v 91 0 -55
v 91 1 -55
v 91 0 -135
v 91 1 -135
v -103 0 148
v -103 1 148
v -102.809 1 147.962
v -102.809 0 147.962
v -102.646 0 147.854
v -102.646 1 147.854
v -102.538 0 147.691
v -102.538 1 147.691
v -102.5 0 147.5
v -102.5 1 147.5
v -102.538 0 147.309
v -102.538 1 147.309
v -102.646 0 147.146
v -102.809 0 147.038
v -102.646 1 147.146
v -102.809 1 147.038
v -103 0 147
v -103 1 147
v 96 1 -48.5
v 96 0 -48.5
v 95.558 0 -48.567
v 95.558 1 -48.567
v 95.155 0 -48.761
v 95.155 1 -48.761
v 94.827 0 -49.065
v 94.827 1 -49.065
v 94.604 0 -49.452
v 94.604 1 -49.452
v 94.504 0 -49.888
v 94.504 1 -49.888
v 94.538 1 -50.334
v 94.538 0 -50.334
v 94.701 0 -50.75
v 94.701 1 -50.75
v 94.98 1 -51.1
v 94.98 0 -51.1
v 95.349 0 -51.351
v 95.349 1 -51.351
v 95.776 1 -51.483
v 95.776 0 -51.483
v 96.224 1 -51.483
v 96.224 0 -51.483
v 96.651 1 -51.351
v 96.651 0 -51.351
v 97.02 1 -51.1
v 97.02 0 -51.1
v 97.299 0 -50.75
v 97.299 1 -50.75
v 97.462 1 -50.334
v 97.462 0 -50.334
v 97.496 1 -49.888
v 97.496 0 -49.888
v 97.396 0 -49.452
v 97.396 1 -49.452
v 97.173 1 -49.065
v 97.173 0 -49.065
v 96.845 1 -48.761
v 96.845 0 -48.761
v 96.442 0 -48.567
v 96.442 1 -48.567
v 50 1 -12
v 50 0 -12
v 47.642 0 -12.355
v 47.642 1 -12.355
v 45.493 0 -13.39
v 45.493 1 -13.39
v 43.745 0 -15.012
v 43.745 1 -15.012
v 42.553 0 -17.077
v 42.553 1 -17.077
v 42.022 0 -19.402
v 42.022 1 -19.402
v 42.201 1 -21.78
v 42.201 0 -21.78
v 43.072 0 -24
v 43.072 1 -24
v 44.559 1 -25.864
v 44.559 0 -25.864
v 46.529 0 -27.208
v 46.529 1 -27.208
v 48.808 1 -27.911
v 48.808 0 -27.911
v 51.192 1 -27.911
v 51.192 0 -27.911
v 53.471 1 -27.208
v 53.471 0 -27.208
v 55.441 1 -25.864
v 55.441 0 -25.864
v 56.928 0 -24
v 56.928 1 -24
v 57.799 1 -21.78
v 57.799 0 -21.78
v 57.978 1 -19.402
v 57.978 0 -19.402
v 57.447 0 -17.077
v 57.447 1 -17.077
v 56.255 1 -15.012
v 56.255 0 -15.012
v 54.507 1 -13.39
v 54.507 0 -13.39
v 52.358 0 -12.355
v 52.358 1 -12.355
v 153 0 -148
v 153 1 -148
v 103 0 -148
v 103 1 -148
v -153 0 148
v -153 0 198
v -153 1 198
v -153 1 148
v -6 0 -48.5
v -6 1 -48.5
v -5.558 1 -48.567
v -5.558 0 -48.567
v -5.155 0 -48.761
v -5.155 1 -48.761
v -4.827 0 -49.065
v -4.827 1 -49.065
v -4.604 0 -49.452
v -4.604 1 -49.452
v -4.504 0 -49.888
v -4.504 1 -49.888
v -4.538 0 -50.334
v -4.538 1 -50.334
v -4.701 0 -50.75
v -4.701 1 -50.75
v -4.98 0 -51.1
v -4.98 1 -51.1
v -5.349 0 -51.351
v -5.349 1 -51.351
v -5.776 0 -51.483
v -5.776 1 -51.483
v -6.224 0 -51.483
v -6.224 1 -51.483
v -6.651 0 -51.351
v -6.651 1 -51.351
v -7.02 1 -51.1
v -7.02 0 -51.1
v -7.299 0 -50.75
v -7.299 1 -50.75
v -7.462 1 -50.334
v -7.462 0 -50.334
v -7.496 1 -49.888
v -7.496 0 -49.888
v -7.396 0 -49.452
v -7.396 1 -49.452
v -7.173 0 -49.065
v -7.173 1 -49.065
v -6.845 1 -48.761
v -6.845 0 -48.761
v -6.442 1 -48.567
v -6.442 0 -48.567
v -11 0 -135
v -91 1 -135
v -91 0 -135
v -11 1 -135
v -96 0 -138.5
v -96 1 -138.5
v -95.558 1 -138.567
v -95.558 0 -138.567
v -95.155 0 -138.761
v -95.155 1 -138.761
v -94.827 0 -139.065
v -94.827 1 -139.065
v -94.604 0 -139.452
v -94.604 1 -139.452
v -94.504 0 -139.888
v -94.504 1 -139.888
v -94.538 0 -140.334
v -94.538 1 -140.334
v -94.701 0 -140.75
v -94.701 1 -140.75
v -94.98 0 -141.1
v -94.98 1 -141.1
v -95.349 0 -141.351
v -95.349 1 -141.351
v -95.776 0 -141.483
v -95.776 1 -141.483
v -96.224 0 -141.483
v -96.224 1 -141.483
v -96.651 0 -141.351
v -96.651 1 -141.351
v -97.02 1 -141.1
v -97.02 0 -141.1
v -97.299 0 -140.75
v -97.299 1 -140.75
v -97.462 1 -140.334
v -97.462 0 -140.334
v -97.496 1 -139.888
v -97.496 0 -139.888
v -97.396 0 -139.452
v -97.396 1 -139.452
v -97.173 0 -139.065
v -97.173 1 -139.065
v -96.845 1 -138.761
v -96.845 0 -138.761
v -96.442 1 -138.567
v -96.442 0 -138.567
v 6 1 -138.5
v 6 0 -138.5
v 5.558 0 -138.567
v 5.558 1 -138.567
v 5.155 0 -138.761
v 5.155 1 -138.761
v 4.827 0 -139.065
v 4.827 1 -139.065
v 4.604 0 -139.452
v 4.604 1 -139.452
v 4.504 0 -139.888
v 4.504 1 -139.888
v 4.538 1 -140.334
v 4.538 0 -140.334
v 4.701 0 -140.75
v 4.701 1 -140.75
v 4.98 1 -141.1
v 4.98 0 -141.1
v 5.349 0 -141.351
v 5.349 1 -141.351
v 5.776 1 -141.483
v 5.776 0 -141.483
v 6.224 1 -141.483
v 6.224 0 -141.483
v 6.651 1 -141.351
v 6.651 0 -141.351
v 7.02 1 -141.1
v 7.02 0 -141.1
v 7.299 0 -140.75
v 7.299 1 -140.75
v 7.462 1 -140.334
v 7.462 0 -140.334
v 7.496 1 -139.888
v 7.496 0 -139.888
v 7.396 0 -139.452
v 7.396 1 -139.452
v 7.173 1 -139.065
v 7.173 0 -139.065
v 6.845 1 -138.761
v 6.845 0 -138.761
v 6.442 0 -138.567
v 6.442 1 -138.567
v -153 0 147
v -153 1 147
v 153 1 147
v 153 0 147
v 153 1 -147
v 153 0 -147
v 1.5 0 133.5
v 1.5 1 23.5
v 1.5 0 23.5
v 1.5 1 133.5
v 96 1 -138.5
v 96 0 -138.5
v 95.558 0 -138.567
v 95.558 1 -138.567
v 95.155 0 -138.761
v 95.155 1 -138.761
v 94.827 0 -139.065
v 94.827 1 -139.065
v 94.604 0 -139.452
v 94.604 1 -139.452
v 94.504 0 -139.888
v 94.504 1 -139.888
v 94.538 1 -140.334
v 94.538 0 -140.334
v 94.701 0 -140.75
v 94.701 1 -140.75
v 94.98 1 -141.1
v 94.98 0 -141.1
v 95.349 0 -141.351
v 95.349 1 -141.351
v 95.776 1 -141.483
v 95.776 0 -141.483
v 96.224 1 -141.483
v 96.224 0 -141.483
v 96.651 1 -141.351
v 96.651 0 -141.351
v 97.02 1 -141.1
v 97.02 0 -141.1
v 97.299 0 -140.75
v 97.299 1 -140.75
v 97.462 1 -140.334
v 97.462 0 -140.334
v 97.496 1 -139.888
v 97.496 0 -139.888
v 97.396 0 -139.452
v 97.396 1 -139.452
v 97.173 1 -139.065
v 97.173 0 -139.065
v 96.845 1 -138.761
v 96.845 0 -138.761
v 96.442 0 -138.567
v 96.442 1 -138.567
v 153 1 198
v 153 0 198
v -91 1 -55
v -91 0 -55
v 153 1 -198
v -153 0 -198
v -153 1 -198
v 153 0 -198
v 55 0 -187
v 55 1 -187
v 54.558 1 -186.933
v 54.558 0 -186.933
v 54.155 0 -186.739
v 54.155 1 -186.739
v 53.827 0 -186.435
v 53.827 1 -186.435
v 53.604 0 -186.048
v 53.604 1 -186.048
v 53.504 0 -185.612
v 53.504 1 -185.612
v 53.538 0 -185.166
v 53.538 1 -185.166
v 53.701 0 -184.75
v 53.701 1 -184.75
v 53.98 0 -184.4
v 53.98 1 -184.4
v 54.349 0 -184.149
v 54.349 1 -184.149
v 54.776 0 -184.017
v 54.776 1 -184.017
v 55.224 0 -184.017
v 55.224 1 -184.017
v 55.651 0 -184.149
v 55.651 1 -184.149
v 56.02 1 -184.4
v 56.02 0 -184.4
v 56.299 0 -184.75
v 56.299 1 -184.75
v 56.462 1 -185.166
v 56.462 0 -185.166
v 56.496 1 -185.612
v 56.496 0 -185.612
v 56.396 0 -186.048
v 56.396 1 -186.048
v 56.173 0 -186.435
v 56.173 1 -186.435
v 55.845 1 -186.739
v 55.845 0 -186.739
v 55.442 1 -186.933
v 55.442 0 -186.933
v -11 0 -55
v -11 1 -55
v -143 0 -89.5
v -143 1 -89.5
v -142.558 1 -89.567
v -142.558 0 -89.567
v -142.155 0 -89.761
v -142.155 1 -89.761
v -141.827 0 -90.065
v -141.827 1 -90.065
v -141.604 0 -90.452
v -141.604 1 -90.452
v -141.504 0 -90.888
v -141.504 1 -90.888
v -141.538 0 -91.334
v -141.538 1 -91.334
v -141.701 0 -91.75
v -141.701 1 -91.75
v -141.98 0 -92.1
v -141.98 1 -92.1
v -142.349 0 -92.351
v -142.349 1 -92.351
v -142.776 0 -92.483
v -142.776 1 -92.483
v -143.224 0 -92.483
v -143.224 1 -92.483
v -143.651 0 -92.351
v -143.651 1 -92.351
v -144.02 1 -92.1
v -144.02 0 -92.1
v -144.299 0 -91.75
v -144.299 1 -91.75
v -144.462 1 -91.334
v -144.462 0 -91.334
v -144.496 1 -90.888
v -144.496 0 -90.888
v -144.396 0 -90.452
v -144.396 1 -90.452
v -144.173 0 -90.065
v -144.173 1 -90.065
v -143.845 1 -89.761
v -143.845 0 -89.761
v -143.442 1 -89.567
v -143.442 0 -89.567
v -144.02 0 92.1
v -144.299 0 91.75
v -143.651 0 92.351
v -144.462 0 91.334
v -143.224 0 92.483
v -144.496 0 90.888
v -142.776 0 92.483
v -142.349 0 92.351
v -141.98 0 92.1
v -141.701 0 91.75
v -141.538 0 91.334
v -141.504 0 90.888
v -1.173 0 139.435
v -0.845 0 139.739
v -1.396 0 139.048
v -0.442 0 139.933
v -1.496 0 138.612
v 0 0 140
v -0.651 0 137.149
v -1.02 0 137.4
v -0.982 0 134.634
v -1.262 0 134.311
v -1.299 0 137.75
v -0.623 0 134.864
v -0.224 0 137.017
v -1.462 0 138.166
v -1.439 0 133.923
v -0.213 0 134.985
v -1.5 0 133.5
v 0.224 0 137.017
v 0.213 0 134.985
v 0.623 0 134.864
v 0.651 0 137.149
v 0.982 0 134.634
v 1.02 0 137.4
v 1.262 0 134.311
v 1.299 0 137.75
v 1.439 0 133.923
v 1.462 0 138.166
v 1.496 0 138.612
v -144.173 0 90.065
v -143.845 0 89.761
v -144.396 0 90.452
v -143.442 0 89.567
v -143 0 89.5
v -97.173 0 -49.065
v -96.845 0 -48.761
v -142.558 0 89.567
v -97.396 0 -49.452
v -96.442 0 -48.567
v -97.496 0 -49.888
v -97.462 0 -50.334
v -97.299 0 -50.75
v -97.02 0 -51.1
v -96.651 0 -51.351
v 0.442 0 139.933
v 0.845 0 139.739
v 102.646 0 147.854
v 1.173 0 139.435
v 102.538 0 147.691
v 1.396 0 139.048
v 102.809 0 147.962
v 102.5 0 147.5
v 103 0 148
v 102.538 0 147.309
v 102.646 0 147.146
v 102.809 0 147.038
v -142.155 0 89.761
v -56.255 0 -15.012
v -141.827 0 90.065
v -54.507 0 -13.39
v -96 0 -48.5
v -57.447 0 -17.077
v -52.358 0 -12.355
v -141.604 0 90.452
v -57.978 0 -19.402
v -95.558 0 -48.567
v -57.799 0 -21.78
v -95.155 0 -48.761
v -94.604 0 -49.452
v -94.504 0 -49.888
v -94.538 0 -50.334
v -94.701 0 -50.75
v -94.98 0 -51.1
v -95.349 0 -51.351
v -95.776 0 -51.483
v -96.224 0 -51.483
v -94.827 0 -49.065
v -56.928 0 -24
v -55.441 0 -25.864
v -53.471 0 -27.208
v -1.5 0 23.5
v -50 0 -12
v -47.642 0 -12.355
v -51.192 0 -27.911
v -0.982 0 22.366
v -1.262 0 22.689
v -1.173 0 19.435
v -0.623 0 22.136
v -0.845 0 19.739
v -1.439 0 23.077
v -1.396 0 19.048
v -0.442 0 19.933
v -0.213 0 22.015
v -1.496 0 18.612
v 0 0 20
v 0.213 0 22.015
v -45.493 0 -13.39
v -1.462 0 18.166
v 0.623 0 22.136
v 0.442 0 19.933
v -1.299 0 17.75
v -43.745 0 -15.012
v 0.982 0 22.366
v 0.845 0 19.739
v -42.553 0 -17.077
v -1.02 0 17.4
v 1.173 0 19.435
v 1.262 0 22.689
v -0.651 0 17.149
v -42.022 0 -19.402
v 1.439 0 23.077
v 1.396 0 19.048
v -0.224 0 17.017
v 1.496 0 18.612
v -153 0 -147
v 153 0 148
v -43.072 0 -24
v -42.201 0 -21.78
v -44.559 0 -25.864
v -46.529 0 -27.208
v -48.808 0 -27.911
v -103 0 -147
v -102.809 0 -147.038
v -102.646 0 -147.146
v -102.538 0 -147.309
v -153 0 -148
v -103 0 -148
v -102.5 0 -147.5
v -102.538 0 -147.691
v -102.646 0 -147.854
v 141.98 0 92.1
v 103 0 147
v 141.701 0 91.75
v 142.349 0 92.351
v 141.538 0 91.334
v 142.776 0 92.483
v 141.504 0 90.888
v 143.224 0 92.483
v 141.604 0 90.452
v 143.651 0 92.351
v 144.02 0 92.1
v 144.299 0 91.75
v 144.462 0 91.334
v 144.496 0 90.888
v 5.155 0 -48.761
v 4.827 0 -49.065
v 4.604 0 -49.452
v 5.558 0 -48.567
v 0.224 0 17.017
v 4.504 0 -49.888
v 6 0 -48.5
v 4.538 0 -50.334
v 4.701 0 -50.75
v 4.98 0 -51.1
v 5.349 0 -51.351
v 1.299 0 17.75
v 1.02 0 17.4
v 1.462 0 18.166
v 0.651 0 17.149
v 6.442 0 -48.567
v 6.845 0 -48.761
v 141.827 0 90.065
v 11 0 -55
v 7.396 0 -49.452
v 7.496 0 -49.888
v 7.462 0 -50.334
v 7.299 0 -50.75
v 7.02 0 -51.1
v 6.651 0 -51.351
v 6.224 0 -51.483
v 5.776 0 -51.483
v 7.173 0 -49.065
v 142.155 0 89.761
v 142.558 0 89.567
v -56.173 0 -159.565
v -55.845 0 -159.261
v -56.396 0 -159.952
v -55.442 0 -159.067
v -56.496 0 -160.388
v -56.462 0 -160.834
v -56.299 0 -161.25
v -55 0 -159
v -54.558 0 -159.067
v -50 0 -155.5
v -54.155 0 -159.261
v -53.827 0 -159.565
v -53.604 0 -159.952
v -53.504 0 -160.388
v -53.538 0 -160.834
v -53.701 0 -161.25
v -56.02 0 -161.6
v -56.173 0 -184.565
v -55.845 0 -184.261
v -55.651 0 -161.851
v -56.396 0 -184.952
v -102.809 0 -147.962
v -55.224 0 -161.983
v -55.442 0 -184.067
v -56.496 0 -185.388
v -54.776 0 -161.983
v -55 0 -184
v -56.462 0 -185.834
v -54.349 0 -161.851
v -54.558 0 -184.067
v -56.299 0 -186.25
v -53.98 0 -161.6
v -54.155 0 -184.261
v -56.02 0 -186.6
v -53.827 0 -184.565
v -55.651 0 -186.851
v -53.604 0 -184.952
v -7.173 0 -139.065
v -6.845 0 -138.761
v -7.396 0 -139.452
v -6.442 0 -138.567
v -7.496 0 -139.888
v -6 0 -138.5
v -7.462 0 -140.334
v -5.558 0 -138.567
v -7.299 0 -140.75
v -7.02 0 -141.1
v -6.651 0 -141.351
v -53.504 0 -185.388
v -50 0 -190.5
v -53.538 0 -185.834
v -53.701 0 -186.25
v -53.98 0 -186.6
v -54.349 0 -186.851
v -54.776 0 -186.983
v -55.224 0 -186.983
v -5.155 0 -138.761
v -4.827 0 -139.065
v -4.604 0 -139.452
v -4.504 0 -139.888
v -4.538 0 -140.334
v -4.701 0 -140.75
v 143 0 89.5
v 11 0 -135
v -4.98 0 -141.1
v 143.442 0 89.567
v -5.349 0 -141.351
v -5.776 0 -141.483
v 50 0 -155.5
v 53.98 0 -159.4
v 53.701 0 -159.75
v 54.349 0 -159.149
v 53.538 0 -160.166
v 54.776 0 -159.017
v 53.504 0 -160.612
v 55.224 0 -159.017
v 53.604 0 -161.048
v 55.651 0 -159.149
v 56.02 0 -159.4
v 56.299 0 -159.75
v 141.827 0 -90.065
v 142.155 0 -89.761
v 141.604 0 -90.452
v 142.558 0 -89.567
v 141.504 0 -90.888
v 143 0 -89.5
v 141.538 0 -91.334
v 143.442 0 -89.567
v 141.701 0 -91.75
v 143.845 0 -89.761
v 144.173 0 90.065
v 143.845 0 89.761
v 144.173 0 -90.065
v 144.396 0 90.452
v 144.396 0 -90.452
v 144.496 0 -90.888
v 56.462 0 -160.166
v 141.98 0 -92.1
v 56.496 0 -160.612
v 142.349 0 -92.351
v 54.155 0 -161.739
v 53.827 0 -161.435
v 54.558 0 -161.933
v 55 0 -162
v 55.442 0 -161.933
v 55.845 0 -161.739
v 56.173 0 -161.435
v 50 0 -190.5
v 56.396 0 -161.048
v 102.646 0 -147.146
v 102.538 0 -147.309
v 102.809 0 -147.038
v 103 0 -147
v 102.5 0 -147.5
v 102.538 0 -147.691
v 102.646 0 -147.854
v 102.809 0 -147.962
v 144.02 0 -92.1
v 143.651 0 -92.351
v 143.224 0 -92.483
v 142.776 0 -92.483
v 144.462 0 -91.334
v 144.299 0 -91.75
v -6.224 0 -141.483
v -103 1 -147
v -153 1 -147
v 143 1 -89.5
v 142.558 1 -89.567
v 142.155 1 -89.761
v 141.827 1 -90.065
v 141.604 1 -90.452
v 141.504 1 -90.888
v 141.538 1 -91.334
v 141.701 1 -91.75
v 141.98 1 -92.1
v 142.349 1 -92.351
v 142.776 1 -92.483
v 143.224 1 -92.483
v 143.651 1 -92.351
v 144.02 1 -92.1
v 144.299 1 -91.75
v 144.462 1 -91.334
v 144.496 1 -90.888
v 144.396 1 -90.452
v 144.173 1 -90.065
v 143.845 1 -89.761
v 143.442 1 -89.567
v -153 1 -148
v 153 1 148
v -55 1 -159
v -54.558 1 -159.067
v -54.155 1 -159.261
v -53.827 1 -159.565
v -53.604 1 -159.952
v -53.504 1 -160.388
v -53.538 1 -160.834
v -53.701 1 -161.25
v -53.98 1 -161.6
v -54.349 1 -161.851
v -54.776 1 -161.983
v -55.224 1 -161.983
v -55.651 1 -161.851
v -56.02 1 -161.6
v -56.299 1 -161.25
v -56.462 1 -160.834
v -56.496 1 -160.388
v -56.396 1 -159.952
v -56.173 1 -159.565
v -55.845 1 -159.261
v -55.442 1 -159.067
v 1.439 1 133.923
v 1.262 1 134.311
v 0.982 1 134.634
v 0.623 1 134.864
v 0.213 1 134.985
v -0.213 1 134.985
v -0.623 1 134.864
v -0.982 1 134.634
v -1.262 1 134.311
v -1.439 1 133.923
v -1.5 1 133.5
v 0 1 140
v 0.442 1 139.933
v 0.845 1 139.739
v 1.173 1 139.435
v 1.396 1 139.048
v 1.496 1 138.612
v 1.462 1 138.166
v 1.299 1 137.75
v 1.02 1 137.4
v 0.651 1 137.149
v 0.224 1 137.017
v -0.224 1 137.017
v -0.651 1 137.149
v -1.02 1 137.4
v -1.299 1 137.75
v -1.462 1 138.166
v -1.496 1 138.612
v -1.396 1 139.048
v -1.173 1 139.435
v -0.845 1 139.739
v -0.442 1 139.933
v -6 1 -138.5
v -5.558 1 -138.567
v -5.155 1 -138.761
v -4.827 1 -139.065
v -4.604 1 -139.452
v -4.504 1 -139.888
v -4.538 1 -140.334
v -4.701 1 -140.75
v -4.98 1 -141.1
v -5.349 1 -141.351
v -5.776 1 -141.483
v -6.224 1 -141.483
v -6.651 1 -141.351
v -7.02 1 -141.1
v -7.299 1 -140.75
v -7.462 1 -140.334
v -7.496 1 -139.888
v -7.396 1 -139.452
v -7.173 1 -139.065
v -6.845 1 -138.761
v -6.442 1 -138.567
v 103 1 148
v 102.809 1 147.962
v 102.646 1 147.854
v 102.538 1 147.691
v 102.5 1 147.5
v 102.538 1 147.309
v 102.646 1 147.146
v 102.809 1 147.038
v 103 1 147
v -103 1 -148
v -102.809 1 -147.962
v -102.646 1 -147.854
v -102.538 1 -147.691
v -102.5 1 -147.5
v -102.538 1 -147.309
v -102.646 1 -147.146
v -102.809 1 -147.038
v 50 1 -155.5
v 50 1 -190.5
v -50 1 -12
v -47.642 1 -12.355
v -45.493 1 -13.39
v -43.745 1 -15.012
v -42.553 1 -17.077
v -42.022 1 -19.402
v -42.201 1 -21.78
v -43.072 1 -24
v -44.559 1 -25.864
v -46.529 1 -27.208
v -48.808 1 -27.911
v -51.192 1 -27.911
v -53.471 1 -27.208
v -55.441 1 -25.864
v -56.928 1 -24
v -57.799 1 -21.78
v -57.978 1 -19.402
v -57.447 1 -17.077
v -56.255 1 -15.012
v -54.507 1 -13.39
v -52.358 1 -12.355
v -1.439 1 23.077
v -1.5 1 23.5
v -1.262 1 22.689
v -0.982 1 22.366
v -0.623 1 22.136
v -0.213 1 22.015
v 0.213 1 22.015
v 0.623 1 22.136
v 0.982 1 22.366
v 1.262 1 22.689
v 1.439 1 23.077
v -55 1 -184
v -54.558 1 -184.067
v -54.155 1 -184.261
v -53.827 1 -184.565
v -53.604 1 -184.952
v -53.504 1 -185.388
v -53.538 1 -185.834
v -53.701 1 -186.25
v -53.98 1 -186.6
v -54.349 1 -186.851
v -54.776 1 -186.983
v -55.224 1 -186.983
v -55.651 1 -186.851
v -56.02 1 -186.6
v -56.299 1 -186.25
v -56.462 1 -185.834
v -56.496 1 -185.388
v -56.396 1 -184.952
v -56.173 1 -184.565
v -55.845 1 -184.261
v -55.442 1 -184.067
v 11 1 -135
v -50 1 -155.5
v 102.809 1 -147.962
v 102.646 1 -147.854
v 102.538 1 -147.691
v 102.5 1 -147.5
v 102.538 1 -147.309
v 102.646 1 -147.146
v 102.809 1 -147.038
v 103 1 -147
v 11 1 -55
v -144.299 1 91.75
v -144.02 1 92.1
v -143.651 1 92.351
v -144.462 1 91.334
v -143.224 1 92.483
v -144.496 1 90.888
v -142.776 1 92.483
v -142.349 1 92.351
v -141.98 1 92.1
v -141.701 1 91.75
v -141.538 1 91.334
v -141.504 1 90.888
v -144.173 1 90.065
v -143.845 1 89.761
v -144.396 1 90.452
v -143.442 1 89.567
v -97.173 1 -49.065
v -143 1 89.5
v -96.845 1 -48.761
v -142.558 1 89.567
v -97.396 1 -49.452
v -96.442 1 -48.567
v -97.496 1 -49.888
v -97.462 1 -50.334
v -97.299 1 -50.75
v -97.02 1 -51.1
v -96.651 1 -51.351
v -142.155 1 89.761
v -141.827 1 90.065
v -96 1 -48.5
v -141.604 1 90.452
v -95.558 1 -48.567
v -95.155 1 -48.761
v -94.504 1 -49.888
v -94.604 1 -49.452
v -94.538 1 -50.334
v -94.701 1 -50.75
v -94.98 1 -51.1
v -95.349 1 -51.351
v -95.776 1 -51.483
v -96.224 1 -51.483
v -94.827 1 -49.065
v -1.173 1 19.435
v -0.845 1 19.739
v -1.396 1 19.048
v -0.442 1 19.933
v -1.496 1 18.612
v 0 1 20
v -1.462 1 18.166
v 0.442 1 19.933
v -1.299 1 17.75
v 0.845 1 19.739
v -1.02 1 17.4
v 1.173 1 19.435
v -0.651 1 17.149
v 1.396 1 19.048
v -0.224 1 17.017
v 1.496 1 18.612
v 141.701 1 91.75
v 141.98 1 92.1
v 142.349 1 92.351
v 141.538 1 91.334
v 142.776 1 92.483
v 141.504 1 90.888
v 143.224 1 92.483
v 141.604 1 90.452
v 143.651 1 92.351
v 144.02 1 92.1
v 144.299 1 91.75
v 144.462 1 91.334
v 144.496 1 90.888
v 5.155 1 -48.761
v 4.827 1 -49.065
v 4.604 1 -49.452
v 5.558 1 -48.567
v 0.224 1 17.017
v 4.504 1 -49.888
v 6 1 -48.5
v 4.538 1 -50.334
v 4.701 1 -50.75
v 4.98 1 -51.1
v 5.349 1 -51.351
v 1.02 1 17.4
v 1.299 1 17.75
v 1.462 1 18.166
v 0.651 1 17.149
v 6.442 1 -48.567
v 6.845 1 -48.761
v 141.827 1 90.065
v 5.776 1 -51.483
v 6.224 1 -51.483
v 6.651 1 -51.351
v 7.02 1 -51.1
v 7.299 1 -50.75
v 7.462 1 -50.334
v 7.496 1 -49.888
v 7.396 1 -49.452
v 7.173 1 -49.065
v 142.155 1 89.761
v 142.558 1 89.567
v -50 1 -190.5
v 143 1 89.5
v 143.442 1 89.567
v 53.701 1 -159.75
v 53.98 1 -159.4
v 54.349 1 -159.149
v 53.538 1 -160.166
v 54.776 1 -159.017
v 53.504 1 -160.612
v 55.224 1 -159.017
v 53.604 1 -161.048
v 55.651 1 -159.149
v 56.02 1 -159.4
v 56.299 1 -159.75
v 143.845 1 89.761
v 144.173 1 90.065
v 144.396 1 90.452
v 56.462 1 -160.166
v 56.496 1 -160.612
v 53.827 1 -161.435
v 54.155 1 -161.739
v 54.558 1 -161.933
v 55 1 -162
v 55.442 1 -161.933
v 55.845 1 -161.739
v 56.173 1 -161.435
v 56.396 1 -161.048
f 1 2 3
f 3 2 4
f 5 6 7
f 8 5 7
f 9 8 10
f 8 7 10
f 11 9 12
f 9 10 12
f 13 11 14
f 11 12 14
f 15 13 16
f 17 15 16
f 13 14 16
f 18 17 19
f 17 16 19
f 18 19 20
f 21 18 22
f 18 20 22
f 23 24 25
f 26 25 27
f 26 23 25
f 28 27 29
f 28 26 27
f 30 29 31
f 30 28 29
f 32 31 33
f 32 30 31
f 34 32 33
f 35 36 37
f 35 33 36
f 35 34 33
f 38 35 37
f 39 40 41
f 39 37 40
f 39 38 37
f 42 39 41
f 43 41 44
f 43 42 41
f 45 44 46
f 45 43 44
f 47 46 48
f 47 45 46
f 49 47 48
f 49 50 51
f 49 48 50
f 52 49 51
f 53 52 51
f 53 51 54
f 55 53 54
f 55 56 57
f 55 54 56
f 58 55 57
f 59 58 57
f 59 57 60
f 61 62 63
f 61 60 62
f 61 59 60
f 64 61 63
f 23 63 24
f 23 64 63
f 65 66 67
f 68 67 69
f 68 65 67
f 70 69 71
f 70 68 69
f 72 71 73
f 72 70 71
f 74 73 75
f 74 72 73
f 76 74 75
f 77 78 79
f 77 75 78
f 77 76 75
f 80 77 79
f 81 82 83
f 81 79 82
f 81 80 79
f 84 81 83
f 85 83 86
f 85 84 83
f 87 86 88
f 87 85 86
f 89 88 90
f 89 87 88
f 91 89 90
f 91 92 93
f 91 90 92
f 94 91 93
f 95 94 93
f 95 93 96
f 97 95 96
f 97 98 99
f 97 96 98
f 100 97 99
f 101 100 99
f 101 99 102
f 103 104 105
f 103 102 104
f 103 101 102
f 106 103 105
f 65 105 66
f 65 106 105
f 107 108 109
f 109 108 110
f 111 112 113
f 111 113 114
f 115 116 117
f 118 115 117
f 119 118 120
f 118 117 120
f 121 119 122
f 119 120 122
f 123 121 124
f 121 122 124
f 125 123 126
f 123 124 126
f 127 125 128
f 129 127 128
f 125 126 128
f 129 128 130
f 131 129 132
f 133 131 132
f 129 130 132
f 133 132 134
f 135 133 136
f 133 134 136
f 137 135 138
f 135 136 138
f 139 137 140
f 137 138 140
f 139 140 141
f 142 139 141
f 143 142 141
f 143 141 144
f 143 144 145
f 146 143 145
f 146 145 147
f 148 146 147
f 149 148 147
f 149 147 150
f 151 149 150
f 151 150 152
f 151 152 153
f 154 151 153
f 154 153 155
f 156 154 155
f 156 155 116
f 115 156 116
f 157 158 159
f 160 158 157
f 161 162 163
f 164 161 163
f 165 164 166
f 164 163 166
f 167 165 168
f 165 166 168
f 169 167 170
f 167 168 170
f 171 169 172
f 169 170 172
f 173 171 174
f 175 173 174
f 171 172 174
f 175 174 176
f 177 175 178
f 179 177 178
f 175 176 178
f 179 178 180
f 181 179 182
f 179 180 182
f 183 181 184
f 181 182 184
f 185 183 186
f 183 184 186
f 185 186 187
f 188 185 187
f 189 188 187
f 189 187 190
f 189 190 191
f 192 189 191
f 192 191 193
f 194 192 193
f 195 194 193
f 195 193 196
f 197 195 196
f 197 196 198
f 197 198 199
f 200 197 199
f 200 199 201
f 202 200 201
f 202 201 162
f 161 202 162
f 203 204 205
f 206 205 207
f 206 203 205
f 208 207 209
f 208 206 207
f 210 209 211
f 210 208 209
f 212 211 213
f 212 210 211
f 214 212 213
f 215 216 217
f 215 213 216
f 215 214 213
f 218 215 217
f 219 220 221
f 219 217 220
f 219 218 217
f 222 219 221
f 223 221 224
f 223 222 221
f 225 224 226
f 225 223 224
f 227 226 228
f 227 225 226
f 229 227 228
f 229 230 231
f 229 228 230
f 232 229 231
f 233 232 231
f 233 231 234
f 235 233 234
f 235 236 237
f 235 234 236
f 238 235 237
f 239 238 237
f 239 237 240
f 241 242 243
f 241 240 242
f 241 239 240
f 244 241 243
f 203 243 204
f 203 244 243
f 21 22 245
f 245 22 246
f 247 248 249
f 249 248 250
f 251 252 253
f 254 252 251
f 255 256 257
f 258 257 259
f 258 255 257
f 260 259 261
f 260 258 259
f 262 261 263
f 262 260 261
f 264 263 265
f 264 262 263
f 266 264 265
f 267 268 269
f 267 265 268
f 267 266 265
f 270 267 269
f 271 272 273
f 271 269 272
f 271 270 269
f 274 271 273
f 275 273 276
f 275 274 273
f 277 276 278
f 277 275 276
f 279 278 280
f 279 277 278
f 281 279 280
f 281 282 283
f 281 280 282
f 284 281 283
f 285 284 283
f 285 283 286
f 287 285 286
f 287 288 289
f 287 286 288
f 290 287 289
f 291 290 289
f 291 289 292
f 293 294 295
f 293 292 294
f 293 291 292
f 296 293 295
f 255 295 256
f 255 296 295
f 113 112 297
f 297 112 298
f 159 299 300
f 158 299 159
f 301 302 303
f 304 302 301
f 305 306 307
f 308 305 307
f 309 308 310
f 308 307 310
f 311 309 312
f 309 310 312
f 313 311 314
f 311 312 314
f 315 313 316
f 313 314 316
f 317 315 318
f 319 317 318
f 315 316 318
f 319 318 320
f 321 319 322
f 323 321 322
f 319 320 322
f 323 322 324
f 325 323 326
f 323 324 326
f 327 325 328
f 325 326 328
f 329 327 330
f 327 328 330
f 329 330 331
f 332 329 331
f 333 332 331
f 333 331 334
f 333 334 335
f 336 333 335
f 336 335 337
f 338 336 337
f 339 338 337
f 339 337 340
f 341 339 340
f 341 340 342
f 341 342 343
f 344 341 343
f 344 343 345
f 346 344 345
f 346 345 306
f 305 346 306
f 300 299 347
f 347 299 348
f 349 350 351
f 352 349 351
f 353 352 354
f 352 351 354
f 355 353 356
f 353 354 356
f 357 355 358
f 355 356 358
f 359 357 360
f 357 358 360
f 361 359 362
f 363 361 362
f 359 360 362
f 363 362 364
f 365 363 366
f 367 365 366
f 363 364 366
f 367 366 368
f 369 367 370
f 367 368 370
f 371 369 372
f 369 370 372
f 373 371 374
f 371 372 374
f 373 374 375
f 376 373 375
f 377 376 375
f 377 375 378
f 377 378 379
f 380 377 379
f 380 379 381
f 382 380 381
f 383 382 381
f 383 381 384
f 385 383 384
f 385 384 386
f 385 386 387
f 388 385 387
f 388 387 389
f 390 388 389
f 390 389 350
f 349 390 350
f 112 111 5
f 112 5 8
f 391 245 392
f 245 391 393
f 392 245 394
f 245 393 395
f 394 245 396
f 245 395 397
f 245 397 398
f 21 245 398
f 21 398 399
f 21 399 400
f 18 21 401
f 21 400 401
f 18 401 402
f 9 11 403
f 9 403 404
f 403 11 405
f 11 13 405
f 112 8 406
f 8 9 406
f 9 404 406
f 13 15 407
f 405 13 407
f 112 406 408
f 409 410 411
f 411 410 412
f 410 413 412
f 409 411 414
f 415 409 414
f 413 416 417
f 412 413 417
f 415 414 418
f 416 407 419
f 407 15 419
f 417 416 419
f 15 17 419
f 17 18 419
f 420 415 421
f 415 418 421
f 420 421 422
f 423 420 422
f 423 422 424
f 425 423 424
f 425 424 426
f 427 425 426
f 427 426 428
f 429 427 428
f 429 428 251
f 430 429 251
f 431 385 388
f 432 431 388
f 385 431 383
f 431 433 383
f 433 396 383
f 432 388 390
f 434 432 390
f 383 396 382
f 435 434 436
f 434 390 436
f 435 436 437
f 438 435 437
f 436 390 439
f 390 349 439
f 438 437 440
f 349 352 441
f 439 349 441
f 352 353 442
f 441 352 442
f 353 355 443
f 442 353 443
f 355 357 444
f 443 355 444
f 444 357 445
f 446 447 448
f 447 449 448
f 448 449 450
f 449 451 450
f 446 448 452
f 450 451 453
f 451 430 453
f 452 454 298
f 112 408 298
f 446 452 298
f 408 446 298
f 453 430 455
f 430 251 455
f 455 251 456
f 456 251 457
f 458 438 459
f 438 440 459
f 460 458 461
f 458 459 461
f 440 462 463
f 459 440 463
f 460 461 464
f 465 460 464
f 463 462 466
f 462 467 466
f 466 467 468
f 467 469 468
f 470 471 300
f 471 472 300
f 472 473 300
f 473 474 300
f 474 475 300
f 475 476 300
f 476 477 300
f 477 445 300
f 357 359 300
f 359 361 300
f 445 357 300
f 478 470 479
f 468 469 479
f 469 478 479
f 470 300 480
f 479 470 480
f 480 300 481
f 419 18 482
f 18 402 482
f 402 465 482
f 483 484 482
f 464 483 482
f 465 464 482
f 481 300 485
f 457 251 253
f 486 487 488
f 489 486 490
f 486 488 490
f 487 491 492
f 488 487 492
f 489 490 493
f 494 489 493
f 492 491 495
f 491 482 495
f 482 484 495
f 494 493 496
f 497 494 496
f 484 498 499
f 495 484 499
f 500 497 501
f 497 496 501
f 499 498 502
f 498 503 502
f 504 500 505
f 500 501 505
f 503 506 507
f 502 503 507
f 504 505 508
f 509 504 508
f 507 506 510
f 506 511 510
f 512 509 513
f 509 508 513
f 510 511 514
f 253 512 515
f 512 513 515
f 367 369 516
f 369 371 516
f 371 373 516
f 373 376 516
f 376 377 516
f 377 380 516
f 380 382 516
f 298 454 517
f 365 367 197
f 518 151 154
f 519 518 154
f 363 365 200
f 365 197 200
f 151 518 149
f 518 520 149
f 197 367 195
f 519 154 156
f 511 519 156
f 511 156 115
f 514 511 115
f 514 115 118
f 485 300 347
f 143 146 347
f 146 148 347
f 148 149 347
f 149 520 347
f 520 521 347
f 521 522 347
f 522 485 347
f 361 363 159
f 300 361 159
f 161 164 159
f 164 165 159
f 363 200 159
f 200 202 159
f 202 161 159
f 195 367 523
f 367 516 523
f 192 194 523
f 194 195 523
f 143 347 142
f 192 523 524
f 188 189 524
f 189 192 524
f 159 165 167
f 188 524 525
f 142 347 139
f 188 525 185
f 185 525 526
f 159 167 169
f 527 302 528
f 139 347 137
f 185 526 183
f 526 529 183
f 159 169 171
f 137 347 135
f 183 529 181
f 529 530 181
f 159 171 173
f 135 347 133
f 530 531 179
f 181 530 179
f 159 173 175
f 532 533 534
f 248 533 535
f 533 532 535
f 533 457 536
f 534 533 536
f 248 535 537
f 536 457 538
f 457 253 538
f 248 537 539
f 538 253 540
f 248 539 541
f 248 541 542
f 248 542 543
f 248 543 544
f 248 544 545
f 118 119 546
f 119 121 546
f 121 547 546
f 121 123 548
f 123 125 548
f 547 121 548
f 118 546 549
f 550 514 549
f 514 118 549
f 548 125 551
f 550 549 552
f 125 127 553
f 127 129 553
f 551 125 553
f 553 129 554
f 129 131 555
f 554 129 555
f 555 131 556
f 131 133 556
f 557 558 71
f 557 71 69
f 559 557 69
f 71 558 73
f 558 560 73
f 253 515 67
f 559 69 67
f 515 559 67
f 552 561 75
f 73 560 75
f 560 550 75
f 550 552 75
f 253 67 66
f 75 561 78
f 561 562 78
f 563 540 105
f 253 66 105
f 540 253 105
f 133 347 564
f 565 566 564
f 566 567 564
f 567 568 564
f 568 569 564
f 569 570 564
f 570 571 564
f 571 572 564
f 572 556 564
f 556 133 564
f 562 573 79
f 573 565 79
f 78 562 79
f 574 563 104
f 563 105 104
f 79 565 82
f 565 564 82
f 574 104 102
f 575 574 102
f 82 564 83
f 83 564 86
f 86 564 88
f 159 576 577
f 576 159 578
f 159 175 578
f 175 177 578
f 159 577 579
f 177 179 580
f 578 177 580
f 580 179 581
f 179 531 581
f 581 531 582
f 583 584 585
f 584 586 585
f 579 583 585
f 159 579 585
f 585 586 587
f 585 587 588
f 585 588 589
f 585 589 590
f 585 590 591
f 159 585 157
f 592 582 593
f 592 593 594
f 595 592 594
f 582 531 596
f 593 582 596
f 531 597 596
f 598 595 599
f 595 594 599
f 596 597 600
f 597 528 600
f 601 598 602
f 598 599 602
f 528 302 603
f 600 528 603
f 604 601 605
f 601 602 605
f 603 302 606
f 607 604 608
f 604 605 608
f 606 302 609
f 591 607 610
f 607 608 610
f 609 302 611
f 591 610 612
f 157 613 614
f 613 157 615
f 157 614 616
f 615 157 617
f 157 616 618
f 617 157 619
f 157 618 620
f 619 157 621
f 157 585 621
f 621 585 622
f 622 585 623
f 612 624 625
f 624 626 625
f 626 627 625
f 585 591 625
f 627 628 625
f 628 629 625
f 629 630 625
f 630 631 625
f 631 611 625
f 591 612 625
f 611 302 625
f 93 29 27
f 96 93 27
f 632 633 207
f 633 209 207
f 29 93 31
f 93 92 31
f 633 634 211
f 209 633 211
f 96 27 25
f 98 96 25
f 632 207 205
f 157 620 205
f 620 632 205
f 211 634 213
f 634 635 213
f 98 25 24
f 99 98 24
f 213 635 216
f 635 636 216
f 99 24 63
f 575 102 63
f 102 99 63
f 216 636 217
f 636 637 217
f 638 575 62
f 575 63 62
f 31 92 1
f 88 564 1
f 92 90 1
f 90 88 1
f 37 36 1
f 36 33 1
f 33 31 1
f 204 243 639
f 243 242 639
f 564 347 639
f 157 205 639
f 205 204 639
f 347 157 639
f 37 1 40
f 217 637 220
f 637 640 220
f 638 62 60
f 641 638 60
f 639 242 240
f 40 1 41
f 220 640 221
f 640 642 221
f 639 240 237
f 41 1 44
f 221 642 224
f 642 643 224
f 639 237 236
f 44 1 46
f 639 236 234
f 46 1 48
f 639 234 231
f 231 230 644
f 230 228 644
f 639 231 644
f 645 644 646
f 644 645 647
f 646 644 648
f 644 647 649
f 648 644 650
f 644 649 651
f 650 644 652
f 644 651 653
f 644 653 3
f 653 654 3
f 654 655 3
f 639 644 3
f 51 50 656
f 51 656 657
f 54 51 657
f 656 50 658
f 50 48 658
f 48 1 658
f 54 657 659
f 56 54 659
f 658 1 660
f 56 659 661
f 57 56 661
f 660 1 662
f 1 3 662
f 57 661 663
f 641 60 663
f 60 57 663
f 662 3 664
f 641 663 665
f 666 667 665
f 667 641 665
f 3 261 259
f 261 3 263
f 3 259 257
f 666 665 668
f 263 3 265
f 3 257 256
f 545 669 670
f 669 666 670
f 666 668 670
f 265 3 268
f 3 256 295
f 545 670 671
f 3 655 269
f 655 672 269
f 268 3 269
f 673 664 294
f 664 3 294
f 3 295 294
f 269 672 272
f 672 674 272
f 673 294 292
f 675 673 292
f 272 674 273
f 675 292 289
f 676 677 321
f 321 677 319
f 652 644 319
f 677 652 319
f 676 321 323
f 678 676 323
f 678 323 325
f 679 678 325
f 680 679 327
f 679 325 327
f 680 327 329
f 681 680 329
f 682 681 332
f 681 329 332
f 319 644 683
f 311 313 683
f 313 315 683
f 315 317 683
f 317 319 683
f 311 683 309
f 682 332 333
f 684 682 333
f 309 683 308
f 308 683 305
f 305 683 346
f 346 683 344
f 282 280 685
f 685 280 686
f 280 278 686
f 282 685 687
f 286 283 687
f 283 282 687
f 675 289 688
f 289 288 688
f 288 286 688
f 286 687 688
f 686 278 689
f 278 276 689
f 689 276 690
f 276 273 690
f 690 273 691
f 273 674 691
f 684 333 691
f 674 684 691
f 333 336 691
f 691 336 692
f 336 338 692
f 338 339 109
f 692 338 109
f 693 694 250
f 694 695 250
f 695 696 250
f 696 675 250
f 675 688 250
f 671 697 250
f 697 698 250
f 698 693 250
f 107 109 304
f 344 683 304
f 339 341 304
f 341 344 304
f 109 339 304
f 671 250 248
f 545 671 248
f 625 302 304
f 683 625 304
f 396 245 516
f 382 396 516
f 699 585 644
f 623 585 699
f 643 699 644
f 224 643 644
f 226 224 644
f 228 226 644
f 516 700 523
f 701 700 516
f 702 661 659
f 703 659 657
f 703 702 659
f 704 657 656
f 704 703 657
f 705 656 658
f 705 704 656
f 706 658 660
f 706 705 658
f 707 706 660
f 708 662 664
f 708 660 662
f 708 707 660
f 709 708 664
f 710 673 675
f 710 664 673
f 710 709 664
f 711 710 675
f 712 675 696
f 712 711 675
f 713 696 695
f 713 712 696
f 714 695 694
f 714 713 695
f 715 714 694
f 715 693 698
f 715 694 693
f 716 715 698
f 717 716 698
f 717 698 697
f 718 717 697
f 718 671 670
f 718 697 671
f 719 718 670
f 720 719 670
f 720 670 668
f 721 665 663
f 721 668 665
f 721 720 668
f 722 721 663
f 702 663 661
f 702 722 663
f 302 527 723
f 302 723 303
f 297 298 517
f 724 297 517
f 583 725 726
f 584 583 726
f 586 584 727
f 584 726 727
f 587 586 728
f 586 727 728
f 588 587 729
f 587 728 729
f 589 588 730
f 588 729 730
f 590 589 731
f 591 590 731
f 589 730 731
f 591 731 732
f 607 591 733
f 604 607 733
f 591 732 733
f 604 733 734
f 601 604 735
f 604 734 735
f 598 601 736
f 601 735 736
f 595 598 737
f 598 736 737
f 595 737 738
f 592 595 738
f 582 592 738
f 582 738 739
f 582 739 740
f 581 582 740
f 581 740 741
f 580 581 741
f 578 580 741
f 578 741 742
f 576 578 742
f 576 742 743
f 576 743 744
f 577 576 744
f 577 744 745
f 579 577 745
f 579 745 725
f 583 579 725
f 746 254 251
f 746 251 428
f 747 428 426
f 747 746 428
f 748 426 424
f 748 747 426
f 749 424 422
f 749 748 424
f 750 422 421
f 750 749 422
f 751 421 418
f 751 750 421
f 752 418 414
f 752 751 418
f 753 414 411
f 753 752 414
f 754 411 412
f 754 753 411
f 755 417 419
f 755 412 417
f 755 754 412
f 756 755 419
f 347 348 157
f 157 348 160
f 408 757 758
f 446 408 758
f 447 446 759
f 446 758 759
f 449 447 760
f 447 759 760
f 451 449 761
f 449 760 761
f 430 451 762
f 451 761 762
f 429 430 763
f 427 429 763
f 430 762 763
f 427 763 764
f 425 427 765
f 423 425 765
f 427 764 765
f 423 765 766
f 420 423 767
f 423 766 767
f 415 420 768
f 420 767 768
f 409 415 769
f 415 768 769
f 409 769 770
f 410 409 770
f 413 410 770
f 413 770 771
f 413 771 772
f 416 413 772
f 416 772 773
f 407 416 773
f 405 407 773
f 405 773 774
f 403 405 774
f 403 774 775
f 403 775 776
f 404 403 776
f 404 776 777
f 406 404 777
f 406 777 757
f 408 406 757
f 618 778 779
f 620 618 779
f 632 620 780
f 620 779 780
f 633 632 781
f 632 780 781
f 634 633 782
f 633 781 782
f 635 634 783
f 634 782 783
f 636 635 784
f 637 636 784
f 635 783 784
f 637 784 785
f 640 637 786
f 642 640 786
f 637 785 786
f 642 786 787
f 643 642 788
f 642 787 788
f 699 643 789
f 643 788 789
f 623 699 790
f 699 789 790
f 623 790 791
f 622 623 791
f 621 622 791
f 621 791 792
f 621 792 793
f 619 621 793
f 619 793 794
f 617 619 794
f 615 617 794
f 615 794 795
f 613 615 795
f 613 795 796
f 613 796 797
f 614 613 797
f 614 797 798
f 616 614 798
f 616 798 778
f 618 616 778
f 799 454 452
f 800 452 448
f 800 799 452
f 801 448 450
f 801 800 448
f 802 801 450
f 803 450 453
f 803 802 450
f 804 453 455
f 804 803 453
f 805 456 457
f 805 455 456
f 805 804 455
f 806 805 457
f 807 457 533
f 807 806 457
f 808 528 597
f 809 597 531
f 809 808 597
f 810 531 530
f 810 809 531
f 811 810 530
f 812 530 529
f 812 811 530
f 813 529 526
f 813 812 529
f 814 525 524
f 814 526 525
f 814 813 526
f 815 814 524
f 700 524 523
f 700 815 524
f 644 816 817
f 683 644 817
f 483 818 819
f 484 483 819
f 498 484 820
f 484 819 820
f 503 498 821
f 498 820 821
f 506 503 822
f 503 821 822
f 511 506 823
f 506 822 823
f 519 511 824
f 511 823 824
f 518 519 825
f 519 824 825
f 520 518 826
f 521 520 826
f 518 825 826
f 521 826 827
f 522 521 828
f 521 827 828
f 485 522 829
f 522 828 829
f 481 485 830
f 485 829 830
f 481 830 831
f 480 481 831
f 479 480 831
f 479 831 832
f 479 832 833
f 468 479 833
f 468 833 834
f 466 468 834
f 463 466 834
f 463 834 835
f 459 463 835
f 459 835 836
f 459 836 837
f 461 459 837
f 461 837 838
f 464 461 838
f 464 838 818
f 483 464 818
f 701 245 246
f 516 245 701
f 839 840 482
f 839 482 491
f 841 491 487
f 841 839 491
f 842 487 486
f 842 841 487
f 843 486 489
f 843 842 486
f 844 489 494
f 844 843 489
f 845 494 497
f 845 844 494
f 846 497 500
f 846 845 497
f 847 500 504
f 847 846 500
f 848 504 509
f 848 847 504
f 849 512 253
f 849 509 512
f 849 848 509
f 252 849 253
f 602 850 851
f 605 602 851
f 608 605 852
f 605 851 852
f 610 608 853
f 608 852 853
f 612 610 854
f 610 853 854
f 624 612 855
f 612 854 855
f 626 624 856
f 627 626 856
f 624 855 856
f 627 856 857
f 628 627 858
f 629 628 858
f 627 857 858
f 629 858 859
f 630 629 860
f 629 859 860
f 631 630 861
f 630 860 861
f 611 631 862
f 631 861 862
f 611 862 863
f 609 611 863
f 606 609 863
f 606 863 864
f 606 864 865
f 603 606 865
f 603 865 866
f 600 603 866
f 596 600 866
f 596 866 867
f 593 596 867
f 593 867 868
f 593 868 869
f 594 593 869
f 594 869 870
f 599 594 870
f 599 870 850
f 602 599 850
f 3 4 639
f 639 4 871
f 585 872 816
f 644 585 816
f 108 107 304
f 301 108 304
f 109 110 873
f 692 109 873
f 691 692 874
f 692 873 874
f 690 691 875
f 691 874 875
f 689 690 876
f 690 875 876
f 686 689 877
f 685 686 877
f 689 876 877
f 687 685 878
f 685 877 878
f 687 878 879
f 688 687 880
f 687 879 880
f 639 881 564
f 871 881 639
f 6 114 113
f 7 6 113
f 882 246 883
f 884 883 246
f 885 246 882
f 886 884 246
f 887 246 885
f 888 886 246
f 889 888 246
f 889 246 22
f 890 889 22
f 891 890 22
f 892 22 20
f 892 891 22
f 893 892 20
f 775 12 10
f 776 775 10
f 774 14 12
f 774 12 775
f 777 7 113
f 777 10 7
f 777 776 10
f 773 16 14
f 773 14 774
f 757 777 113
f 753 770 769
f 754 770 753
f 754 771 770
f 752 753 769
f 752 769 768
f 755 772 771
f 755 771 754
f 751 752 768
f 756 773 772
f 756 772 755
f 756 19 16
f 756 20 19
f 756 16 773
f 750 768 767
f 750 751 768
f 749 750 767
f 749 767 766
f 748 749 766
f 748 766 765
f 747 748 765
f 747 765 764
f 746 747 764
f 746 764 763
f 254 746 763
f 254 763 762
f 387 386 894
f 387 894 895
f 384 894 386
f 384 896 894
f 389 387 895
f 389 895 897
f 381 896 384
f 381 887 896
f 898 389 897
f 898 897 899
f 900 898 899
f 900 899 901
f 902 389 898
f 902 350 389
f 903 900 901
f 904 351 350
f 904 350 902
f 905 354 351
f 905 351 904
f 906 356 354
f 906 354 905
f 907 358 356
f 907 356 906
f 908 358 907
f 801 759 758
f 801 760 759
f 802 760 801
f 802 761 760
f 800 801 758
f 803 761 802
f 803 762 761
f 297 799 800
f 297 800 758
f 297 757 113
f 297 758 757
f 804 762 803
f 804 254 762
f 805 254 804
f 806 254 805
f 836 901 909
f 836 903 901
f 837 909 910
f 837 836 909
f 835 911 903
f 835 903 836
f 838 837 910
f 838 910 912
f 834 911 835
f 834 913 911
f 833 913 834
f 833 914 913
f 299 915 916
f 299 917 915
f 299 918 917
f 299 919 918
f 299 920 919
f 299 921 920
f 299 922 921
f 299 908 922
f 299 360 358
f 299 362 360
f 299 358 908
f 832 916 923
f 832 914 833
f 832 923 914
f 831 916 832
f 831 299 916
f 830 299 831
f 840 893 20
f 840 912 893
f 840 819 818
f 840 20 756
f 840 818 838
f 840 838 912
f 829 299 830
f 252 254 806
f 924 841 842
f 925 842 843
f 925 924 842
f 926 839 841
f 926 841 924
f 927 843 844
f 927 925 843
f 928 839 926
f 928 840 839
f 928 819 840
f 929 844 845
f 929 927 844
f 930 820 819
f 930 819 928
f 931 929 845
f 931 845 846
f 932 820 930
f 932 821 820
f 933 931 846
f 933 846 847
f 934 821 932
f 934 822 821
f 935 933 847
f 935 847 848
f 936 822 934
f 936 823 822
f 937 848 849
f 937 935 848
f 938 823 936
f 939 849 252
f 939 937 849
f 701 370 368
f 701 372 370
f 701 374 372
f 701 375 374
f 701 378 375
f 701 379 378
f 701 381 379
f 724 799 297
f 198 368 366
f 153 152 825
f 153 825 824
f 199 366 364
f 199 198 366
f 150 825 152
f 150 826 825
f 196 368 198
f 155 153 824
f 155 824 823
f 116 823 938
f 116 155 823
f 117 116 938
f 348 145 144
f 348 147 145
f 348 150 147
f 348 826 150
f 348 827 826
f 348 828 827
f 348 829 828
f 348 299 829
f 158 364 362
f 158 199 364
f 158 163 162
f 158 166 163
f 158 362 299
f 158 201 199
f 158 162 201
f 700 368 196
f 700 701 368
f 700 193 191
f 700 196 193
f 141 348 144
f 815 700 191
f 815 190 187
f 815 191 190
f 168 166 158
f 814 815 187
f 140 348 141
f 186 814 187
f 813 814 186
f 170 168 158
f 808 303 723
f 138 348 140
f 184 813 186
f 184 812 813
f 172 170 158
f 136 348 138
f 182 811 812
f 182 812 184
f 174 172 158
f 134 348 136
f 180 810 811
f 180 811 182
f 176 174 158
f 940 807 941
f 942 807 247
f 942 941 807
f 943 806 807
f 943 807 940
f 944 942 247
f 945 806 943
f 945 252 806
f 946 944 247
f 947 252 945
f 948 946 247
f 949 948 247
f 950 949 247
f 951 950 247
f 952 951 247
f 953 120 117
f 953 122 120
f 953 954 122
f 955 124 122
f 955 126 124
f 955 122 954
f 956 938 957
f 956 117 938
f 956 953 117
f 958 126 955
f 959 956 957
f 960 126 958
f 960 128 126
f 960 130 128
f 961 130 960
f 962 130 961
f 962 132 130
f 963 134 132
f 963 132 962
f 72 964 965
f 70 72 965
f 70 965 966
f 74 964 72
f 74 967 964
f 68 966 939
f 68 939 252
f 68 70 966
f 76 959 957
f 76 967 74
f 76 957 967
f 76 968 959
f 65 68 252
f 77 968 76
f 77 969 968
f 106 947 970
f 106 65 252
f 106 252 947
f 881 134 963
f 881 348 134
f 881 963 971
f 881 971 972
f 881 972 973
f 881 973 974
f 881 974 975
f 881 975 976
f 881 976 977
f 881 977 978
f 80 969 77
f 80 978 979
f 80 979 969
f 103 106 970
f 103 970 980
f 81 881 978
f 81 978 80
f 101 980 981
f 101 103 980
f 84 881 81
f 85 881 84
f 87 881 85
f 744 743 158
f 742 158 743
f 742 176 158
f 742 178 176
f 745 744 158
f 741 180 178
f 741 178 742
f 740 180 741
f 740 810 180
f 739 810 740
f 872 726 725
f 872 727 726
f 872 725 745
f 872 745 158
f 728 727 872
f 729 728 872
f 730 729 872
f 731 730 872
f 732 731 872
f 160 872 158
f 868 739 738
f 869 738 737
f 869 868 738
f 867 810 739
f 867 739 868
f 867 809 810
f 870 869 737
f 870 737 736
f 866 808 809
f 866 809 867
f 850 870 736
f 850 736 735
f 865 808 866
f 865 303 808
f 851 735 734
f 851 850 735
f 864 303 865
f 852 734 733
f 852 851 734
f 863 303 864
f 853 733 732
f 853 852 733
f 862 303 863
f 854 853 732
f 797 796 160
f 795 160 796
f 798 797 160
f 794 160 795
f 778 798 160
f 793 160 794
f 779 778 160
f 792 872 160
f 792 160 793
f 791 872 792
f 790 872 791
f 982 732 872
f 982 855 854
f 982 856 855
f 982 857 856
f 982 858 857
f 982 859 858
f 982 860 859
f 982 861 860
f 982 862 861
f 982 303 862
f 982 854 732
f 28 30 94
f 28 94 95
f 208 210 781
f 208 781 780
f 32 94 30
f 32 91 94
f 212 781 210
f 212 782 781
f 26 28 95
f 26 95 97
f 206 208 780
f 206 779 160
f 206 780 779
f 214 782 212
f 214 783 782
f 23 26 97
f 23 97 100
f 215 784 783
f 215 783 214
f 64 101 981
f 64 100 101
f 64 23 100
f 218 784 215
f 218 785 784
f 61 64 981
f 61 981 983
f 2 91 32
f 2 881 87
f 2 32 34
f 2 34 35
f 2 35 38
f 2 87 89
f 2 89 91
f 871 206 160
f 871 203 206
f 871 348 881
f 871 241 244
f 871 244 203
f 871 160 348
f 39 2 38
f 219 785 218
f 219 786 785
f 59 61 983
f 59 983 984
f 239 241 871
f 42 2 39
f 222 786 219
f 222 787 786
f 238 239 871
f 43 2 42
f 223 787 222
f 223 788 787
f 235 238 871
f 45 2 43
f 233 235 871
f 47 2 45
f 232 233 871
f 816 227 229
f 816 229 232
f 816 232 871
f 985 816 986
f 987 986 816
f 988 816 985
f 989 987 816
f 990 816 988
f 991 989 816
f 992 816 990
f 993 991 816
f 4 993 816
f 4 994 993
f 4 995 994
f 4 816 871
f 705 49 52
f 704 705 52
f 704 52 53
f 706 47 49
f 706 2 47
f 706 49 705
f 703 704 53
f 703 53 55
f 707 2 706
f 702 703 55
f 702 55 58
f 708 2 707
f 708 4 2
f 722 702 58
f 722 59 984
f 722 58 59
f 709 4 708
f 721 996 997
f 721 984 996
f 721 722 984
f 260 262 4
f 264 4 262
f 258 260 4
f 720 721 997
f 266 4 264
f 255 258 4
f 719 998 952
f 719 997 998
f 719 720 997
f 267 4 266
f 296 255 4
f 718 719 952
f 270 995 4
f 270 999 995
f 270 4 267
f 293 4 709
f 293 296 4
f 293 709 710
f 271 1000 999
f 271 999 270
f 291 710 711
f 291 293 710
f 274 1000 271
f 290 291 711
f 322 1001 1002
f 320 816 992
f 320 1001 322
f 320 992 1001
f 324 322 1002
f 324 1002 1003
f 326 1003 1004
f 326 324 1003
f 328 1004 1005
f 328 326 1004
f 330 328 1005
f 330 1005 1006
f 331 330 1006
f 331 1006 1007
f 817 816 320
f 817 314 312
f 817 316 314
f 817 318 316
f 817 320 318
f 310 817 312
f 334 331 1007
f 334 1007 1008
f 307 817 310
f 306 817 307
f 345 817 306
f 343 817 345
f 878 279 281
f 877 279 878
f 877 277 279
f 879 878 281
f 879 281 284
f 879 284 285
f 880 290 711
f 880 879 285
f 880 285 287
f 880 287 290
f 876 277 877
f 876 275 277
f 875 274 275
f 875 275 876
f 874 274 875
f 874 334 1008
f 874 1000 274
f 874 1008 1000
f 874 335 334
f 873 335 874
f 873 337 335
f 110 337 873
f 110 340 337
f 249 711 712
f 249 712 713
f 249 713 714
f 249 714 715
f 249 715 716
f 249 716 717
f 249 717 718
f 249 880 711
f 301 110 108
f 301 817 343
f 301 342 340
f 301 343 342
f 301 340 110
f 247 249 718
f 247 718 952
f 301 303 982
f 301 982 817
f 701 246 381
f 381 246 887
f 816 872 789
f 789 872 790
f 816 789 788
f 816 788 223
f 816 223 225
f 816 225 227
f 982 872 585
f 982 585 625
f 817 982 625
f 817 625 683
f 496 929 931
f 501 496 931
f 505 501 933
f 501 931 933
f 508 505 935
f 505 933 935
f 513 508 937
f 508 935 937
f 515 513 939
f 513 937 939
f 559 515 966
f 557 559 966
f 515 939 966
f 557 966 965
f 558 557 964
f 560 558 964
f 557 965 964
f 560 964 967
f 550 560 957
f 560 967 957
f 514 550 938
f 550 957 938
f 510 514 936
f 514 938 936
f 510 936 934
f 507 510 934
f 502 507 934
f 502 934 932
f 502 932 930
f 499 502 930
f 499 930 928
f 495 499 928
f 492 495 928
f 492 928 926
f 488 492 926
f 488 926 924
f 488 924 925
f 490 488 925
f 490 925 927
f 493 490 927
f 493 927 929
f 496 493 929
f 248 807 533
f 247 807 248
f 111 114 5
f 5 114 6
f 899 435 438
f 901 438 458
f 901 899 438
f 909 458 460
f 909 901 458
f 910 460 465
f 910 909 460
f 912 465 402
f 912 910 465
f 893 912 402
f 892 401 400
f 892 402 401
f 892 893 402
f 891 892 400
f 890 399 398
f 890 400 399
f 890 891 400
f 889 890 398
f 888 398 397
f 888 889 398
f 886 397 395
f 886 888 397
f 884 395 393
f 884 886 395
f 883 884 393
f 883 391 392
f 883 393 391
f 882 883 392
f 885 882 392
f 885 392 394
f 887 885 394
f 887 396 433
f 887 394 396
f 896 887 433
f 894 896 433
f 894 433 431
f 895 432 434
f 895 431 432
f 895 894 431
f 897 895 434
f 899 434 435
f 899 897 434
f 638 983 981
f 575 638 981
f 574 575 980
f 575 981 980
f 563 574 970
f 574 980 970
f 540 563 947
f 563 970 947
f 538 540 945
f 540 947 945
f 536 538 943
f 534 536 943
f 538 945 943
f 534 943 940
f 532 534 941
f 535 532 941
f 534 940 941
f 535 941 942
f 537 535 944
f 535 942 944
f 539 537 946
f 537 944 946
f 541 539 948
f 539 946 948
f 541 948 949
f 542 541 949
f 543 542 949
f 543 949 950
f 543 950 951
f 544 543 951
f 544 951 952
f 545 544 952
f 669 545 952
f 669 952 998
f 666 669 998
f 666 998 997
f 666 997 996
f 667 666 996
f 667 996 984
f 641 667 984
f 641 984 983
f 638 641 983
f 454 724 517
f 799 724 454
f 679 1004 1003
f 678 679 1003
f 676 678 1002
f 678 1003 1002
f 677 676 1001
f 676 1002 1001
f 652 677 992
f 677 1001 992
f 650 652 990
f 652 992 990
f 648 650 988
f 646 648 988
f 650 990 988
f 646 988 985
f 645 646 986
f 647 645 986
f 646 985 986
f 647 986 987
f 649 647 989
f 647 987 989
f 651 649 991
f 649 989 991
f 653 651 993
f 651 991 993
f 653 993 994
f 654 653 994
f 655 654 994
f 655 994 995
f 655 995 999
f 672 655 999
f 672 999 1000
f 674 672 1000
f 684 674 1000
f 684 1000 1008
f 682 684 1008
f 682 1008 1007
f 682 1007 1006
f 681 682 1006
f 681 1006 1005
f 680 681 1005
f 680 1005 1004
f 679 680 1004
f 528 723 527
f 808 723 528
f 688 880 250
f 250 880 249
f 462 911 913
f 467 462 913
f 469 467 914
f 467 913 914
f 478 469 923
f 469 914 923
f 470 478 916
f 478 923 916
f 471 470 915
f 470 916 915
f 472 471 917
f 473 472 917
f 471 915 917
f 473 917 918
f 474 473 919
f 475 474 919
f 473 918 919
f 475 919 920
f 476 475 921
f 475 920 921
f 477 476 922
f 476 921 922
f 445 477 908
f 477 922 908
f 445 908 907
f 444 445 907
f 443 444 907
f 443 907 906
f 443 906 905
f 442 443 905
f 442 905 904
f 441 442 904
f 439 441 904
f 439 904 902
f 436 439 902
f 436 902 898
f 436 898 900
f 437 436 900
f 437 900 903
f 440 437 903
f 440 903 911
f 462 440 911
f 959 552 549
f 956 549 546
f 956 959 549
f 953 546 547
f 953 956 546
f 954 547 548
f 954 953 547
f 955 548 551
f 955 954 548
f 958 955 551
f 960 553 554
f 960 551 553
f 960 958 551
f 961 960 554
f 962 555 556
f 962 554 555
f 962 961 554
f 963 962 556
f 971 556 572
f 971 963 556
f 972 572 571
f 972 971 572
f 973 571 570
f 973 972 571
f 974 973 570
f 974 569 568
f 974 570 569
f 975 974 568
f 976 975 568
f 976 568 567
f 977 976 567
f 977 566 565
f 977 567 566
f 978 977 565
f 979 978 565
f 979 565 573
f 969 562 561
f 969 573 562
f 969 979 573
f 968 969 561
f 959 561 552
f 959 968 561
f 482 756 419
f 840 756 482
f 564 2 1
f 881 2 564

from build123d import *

# Parameters (mm, degrees)
SKETCH1_W               = 306
SKETCH1_H               = 396
BOSS_EXTRUDE1_DEPTH     = 1
SKETCH2_R               = 1.5
CUT_EXTRUDE1_DEPTH      = 251.227896127
SKETCH3_R               = 8
CUT_EXTRUDE2_DEPTH      = 251.227896127
SKETCH4_R               = 1.5
SKETCH4_W               = 80
SKETCH4_H               = 80
CUT_EXTRUDE3_DEPTH      = 251.227896127
SKETCH6_R               = 1.5
CUT_EXTRUDE4_DEPTH      = 251.227896127
MIRROR4_COPY_1_SKETCH_R = 1.5
MIRROR4_COPY_1_DEPTH    = 251.227896127
SKETCH8_R               = 1.5
SKETCH8_W               = 100
SKETCH8_H               = 35
CUT_EXTRUDE6_DEPTH      = 251.227896127


with BuildPart() as part:
    # Sketch1 → Boss-Extrude1 (new body)
    with BuildSketch(Plane(origin=(0, 0, 0), x_dir=(1, 0, 0), z_dir=(0, 1, 0))):
        Rectangle(SKETCH1_W, SKETCH1_H)
    extrude(amount=BOSS_EXTRUDE1_DEPTH)

    # Sketch2 → Cut-Extrude1 (cut, through all)
    with BuildSketch(Plane(origin=(0, 1, 0), x_dir=(1, 0, 0), z_dir=(0, 1, 0))):
        with Locations(Location((0, -18.5, 0), (0, 0, 270))):
            Circle(SKETCH2_R)
        with Locations(Location((0, -138.5, 0), (0, 0, 270))):
            Circle(SKETCH2_R)
        with BuildLine():
            Line((1.5, -23.5), (1.5, -133.5))
            ThreePointArc((1.5, -133.5), (0, -135), (-1.5, -133.5))
            Line((-1.5, -133.5), (-1.5, -23.5))
            ThreePointArc((-1.5, -23.5), (0, -22), (1.5, -23.5))
        make_face()
    extrude(amount=-CUT_EXTRUDE1_DEPTH, mode=Mode.SUBTRACT)

    # Sketch3 → Cut-Extrude2 (cut, through all)
    with BuildSketch(Plane(origin=(0, 1, 0), x_dir=(1, 0, 0), z_dir=(0, 1, 0))):
        with Locations(Location((-50, 20, 0), (0, 0, 270))):
            Circle(SKETCH3_R)
    cut_extrude2 = extrude(amount=-CUT_EXTRUDE2_DEPTH, mode=Mode.SUBTRACT)

    # Mirror1: Cut-Extrude2 across plane
    add(cut_extrude2.mirror(Plane(origin=(0, 0, 0), x_dir=(0, 0, 1), z_dir=(1, 0, 0))), mode=Mode.SUBTRACT)

    # Sketch4 → Cut-Extrude3 (cut, through all)
    with BuildSketch(Plane(origin=(0, 1, 0), x_dir=(1, 0, 0), z_dir=(0, 1, 0))):
        with Locations(Location((-96, 140, 0), (0, 0, 270))):
            Circle(SKETCH4_R)
        with Locations(Location((-6, 140, 0), (0, 0, 270))):
            Circle(SKETCH4_R)
        with Locations(Location((-96, 50, 0), (0, 0, 270))):
            Circle(SKETCH4_R)
        with Locations(Location((-6, 50, 0), (0, 0, 270))):
            Circle(SKETCH4_R)
        with Locations((-51, 95)):
            Rectangle(SKETCH4_W, SKETCH4_H)
    cut_extrude3 = extrude(amount=-CUT_EXTRUDE3_DEPTH, mode=Mode.SUBTRACT)

    # Mirror2: Cut-Extrude3 across plane
    add(cut_extrude3.mirror(Plane(origin=(0, 0, 0), x_dir=(0, 0, 1), z_dir=(1, 0, 0))), mode=Mode.SUBTRACT)

    # Sketch6 → Cut-Extrude4 (cut, through all)
    with BuildSketch(Plane(origin=(0, 1, 0), x_dir=(1, 0, 0), z_dir=(0, 1, 0))):
        with Locations(Location((-143, 91, 0), (0, 0, 270))):
            Circle(SKETCH6_R)
        with BuildLine():
            Line((-153, 148), (-103, 148))
            ThreePointArc((-103, 148), (-102.5, 147.5), (-103, 147))
            Line((-103, 147), (-153, 147))
            ThreePointArc((-153, 147), (-153.5, 147.5), (-153, 148))
        make_face()
    cut_extrude4 = extrude(amount=-CUT_EXTRUDE4_DEPTH, mode=Mode.SUBTRACT)

    # Mirror3: Cut-Extrude4 across plane
    add(cut_extrude4.mirror(Plane.XY), mode=Mode.SUBTRACT)

    # Mirror4: Cut-Extrude4 across plane
    add(cut_extrude4.mirror(Plane(origin=(0, 0, 0), x_dir=(0, 0, 1), z_dir=(1, 0, 0))), mode=Mode.SUBTRACT)

    # Mirror4 copy 1 sketch → Mirror4 copy 1 (cut, through all)
    with BuildSketch(Plane(origin=(0, 1, 0), x_dir=(-1, 0, 0), z_dir=(0, 1, 0))):
        with Locations(Location((-143, 91, 0), (0, 0, 270))):
            Circle(MIRROR4_COPY_1_SKETCH_R)
        with BuildLine():
            Line((-153, 148), (-103, 148))
            ThreePointArc((-103, 148), (-102.5, 147.5), (-103, 147))
            Line((-103, 147), (-153, 147))
            ThreePointArc((-153, 147), (-153.5, 147.5), (-153, 148))
        make_face()
    extrude(amount=-MIRROR4_COPY_1_DEPTH, mode=Mode.SUBTRACT)

    # Sketch8 → Cut-Extrude6 (cut, through all)
    with BuildSketch(Plane(origin=(0, 1, 0), x_dir=(1, 0, 0), z_dir=(0, 1, 0))):
        with Locations(Location((-55, 185.5, 0), (0, 0, 270))):
            Circle(SKETCH8_R)
        with Locations(Location((-55, 160.5, 0), (0, 0, 270))):
            Circle(SKETCH8_R)
        with Locations(Location((55, 160.5, 0), (0, 0, 90))):
            Circle(SKETCH8_R)
        with Locations(Location((55, 185.5, 0), (0, 0, 90))):
            Circle(SKETCH8_R)
        with Locations((0, 173)):
            Rectangle(SKETCH8_W, SKETCH8_H)
    extrude(amount=-CUT_EXTRUDE6_DEPTH, mode=Mode.SUBTRACT)


solid = part.part
